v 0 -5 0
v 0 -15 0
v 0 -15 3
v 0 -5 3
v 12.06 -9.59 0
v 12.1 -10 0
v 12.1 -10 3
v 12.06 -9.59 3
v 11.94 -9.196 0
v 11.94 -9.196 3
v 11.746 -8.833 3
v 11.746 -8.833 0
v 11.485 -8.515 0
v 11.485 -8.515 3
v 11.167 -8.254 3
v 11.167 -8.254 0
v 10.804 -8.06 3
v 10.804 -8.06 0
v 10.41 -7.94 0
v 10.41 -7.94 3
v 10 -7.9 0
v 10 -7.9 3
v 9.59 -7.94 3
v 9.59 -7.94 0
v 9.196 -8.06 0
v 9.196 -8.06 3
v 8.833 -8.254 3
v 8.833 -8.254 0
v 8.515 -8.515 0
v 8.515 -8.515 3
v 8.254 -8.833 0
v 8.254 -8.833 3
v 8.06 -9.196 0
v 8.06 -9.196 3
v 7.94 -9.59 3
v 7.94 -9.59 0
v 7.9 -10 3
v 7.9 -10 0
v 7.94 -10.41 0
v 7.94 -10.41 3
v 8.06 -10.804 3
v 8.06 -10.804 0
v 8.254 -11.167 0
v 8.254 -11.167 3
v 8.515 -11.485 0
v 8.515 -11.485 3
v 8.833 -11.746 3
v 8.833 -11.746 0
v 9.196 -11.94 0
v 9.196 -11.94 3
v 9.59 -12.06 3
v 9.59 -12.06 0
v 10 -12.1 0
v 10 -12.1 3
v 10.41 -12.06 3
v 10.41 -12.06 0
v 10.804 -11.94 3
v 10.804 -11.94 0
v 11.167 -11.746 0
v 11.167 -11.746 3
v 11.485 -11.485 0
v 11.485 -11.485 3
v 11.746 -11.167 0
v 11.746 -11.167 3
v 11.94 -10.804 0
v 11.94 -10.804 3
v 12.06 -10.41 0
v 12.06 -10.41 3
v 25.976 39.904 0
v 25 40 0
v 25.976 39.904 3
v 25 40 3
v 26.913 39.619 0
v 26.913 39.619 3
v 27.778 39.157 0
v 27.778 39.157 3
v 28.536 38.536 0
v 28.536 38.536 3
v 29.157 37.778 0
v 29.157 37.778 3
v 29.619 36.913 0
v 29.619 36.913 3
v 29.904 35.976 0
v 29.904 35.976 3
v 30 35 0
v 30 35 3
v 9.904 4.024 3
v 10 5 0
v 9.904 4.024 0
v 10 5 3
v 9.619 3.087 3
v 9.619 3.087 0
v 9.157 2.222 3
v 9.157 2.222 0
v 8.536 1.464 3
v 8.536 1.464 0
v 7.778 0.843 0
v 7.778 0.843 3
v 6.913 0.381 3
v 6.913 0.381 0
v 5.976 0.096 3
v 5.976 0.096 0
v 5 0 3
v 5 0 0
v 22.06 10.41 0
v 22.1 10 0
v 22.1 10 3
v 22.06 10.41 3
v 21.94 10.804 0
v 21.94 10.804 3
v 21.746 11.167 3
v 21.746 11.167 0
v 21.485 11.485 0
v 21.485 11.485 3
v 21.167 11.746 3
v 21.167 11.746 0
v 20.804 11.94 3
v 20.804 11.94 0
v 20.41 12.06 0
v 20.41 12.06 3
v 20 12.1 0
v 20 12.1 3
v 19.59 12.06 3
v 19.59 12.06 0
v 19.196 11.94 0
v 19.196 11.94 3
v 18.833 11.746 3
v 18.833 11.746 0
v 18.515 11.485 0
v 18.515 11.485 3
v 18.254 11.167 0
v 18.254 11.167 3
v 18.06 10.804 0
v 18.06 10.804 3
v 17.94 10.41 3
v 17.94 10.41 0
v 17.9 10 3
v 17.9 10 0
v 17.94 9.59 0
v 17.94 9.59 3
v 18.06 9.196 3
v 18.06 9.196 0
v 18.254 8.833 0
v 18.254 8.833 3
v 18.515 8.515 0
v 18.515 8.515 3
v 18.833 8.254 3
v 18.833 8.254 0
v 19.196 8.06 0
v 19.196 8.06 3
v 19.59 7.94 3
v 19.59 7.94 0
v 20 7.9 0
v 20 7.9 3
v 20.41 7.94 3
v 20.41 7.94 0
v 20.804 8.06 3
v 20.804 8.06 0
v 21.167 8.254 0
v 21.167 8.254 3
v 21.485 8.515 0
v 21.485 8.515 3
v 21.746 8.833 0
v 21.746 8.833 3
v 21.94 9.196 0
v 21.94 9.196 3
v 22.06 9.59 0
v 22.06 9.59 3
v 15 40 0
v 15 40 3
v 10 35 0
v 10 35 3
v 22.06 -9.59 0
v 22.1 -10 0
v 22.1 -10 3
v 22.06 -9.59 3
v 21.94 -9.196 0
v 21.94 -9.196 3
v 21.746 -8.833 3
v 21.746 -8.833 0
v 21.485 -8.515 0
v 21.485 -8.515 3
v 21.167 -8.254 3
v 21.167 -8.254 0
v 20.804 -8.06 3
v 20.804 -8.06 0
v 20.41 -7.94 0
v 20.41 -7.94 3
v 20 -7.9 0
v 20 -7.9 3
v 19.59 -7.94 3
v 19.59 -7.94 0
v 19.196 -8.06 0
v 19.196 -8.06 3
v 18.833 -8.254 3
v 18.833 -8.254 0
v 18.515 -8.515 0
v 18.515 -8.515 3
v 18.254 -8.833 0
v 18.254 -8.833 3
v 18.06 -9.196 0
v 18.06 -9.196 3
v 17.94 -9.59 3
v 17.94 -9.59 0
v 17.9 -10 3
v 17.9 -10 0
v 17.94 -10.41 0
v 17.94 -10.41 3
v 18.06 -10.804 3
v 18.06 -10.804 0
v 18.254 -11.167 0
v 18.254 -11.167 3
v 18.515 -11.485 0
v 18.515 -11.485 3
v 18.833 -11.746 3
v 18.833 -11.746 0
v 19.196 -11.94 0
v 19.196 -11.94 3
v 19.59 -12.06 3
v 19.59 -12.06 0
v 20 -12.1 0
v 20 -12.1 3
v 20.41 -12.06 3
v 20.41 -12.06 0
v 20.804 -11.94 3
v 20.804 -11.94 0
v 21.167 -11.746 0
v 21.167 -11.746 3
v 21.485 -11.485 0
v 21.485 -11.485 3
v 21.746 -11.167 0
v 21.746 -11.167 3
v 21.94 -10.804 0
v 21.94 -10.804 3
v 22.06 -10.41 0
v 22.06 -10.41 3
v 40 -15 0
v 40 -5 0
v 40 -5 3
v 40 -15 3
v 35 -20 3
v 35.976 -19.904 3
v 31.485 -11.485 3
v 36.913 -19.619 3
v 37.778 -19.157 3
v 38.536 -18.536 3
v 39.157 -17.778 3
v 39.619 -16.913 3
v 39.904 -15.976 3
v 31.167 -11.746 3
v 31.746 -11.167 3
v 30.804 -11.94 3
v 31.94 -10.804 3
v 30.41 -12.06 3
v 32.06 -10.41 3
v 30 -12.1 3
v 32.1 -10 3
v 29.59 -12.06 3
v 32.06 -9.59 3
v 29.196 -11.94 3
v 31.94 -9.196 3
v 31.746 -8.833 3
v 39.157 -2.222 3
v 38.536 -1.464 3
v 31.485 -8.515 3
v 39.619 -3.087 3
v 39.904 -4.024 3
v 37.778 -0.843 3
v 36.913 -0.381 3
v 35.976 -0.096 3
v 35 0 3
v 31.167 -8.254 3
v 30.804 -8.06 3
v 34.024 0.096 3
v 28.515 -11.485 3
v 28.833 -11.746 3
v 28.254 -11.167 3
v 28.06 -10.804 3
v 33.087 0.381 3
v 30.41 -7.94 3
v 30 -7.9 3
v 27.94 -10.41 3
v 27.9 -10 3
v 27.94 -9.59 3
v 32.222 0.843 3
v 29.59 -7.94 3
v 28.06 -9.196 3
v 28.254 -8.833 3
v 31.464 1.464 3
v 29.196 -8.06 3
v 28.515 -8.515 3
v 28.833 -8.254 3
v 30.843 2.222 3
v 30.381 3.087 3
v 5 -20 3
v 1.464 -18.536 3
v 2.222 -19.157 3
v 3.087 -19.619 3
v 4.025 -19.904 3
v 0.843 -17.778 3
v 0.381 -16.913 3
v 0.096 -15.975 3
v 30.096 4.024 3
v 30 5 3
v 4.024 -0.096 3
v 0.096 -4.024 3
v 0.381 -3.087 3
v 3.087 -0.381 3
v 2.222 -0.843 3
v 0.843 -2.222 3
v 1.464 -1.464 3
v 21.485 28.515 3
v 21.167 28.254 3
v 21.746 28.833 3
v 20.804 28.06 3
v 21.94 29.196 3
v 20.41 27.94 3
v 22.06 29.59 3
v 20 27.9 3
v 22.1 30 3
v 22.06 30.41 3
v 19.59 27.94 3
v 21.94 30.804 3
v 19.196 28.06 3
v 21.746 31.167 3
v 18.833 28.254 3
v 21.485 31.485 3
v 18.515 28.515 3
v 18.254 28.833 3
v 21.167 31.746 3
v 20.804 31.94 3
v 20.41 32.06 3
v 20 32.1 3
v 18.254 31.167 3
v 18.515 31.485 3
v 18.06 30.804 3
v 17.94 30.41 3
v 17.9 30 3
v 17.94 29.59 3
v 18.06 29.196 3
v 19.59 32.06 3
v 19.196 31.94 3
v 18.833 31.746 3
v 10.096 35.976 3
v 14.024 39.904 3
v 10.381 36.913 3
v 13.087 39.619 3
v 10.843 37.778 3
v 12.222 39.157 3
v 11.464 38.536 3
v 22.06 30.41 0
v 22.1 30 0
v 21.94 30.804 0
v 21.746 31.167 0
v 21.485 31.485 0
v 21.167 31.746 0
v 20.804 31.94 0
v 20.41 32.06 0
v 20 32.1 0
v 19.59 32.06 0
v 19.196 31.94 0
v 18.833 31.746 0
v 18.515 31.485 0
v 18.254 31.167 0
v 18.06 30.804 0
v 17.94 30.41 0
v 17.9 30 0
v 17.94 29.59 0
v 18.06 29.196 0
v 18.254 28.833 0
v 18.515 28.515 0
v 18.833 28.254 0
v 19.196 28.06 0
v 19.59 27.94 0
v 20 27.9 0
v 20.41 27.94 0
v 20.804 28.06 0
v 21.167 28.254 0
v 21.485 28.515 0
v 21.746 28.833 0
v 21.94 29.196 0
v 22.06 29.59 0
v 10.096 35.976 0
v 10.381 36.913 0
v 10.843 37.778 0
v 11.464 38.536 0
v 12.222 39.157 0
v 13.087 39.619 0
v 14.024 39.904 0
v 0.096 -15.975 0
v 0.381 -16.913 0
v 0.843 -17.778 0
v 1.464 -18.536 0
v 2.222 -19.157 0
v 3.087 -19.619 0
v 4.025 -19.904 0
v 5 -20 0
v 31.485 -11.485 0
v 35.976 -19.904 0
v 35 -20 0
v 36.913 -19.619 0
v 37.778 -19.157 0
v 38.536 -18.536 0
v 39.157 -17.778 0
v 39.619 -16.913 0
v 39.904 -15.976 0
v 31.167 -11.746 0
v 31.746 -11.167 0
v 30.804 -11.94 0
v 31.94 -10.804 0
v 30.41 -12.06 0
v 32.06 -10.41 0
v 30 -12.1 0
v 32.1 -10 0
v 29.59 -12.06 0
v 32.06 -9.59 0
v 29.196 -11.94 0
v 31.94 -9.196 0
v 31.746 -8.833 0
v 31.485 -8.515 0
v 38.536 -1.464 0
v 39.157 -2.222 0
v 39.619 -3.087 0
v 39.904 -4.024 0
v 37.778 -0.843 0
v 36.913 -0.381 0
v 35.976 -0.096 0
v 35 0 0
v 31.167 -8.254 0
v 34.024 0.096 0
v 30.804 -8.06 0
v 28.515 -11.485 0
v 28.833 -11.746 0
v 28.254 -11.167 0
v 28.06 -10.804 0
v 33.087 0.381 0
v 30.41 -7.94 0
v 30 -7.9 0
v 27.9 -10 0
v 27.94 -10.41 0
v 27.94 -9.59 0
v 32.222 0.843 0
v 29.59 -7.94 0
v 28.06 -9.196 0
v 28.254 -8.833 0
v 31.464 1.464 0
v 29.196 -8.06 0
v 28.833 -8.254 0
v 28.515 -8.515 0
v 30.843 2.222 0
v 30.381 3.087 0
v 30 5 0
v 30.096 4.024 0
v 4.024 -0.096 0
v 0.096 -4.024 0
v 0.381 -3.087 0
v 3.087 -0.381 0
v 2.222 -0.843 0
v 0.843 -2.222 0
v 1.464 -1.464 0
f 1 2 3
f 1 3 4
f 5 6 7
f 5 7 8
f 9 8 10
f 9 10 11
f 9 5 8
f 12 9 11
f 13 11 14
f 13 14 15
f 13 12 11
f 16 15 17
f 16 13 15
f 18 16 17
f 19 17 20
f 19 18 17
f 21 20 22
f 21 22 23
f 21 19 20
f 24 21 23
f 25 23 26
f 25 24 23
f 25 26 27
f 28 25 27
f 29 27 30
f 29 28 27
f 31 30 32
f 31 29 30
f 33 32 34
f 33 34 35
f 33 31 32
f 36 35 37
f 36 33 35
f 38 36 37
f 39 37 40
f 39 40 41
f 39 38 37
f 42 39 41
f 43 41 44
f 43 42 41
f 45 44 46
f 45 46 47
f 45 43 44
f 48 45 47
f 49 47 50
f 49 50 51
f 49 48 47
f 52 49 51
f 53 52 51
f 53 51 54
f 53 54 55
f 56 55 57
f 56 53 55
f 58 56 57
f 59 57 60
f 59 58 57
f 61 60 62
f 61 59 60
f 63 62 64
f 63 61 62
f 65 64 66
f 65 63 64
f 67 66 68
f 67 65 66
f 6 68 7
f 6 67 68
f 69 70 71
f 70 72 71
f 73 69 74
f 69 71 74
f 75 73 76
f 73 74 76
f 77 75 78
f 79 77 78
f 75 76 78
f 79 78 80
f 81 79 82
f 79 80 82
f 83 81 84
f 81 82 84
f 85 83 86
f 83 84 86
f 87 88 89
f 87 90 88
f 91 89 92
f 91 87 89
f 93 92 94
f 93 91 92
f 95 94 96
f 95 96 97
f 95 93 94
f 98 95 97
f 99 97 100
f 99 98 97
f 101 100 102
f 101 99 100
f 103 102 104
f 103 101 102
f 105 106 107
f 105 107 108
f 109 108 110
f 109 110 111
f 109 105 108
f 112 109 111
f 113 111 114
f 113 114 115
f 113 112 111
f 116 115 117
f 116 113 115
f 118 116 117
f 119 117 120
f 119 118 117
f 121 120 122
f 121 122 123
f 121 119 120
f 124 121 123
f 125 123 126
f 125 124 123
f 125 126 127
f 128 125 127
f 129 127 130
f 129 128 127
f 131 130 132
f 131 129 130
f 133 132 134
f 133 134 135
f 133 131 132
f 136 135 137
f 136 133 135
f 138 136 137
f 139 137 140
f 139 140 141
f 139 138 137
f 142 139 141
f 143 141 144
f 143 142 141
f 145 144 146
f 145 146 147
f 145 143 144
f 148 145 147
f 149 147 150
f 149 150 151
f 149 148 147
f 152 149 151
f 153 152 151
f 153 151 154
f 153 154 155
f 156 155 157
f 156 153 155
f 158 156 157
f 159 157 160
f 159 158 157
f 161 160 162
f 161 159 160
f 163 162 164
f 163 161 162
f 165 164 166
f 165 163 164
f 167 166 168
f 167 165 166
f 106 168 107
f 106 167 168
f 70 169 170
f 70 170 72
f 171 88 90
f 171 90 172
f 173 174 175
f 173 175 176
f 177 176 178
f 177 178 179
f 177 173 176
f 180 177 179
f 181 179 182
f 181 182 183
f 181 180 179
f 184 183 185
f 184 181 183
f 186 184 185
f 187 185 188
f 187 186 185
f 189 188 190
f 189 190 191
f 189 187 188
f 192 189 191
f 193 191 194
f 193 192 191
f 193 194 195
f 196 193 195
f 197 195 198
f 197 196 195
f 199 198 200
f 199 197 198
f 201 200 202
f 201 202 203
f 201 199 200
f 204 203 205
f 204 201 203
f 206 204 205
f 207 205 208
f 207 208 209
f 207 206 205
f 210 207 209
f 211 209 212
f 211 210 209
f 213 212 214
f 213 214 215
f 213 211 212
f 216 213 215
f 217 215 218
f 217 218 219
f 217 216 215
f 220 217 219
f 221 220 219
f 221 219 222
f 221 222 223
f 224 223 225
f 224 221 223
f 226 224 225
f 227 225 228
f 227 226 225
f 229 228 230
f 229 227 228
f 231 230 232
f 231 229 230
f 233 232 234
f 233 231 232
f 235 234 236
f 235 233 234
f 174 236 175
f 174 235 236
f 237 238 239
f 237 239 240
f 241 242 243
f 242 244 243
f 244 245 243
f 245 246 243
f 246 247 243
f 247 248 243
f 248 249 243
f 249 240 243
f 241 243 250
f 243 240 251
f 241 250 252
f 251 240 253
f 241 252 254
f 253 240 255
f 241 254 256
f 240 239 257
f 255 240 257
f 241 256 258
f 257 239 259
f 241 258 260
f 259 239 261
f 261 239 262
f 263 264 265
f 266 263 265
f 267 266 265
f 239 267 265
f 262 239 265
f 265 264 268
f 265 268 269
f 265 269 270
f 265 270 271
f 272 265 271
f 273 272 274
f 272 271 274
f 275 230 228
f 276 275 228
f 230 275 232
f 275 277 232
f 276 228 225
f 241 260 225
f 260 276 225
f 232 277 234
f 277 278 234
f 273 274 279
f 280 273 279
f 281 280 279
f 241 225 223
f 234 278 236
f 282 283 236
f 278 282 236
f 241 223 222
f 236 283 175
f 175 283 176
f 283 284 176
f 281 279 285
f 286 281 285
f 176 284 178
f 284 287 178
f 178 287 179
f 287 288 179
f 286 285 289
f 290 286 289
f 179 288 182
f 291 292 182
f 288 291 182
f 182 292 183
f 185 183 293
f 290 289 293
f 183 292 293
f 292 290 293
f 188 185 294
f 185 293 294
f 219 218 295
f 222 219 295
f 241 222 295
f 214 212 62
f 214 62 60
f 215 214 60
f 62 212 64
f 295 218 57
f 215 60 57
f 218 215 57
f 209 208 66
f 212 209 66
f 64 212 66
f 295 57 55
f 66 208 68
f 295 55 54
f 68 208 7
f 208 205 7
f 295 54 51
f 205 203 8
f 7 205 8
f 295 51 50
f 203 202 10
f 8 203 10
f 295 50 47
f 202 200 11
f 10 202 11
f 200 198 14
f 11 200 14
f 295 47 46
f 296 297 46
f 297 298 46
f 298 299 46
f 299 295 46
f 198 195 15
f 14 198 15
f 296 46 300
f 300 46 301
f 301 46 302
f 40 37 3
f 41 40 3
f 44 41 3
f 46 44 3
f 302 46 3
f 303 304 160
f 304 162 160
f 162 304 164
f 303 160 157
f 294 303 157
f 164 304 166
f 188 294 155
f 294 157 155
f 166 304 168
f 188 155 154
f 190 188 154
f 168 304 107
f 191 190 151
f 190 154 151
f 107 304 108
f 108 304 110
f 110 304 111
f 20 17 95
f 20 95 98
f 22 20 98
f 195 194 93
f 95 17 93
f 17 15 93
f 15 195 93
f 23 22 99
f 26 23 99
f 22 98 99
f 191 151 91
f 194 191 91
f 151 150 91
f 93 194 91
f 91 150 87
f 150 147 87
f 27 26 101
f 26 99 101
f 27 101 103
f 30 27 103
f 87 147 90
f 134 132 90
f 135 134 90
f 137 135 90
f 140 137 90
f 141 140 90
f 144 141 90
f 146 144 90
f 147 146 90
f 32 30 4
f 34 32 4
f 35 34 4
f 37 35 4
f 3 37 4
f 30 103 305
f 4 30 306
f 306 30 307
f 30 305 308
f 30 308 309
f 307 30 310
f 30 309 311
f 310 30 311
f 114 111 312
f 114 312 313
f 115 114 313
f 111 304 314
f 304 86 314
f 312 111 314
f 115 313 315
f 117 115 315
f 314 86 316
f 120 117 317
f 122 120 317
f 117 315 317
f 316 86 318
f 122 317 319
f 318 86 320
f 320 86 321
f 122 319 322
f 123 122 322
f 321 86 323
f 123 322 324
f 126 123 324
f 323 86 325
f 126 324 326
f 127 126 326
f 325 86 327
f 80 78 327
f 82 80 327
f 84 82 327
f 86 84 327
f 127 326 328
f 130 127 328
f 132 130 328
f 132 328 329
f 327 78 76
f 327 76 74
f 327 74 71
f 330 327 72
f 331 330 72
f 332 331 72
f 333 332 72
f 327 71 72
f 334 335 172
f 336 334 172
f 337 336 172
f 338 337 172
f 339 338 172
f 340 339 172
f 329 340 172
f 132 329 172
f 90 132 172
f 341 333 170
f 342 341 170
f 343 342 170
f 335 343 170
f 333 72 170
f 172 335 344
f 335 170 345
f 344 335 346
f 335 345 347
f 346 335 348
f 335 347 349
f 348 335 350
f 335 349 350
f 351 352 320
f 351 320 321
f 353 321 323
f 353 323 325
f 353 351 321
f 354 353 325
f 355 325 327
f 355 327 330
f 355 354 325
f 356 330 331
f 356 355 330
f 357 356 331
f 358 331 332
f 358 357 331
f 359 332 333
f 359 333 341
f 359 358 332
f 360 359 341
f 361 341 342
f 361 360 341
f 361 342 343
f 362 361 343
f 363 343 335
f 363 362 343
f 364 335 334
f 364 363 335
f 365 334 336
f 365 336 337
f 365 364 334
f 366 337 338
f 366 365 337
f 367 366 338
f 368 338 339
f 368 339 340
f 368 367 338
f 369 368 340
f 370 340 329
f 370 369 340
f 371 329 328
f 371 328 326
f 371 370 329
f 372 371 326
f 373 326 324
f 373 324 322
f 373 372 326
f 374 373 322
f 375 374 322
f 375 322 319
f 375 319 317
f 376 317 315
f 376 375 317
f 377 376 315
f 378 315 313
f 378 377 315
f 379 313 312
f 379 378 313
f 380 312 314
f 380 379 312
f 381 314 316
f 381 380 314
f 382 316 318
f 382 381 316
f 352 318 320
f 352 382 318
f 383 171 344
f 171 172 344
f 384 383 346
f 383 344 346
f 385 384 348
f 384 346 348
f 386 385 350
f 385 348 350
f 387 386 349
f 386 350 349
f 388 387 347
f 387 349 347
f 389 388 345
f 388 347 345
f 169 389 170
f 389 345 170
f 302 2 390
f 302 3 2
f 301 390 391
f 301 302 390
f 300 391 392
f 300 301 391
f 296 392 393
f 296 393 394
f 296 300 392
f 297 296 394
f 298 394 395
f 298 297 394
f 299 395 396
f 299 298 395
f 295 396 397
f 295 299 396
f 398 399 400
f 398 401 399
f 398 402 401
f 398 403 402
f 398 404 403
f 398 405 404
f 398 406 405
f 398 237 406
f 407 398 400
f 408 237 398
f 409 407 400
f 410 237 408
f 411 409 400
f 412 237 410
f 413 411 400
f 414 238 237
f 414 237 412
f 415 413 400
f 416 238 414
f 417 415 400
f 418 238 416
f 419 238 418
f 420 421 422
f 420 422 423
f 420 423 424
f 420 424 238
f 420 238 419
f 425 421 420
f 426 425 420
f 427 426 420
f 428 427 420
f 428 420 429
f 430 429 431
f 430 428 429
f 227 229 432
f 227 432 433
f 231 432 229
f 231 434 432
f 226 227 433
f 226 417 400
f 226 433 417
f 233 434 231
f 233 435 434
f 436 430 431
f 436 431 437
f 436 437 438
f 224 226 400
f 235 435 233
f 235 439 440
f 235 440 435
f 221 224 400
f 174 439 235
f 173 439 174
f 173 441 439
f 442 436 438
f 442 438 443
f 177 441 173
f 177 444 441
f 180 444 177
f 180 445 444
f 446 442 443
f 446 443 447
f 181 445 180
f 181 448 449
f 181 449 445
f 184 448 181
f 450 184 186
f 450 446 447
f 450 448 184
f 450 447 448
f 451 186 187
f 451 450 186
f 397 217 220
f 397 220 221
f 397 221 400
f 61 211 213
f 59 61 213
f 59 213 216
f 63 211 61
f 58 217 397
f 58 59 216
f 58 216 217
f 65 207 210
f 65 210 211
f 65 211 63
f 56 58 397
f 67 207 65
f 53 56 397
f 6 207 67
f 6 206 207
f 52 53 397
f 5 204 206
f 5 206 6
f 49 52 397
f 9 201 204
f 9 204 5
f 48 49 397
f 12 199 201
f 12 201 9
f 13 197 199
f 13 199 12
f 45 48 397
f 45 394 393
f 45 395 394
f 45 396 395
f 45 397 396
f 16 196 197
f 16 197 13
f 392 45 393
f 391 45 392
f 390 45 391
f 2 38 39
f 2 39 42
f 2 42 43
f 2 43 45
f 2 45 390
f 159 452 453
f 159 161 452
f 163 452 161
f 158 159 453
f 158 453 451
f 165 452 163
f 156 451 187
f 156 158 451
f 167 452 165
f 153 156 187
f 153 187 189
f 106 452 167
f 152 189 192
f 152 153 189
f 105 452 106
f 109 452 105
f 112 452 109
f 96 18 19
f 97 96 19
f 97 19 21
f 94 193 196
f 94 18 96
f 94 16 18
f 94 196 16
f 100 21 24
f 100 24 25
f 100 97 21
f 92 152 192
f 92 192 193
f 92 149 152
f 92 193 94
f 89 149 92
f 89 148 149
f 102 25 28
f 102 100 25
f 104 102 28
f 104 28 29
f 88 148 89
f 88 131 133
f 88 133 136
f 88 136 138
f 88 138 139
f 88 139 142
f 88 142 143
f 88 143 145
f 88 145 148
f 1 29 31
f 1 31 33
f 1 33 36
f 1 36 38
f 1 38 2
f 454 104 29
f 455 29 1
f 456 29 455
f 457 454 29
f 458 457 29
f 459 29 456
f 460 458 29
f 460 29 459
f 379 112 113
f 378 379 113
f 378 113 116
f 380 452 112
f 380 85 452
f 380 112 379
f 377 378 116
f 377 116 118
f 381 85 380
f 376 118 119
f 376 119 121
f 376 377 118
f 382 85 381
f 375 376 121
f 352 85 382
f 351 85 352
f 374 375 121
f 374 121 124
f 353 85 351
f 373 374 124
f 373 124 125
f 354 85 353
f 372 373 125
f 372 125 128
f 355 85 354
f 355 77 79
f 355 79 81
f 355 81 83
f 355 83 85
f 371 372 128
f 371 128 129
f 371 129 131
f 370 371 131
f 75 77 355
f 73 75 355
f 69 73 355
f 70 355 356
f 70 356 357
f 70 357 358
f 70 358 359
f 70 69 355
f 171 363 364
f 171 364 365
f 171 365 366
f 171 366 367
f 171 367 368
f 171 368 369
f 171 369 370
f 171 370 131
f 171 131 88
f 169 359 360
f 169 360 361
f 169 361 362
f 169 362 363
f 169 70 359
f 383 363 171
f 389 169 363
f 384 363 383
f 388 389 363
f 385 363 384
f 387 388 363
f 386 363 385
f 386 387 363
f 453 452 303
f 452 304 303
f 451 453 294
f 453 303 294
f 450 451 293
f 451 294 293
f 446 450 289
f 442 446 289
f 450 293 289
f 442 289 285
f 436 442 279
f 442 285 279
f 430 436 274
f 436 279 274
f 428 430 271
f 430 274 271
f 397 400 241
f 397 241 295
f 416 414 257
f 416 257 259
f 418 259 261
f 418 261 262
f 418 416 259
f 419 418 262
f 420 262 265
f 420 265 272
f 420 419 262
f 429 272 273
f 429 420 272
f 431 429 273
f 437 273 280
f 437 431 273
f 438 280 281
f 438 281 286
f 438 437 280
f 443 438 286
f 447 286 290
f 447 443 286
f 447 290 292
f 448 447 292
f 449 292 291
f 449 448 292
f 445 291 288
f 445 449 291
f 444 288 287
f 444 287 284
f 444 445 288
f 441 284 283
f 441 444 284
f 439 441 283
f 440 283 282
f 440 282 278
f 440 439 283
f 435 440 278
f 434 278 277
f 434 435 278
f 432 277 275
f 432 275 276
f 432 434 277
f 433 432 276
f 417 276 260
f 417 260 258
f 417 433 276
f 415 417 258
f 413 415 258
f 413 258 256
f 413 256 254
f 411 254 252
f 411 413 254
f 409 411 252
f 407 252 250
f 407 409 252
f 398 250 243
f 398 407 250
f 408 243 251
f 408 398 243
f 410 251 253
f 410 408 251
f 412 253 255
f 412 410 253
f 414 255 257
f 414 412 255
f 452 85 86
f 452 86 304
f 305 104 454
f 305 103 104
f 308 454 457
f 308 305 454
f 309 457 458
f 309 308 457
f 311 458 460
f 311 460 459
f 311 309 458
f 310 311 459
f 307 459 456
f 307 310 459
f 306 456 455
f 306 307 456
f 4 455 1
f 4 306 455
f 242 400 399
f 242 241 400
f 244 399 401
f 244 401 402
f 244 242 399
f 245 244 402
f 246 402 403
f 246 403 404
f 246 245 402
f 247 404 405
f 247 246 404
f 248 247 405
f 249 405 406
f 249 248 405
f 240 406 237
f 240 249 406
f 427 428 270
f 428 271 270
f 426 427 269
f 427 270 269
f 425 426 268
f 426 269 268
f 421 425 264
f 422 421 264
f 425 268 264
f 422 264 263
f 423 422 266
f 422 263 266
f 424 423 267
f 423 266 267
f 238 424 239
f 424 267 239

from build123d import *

# Parameters (mm, degrees)
SKETCH_1_R      = 2.1
EXTRUDE_1_DEPTH = 3
FILLET_1_R      = 5
FILLET_2_R      = 5


with BuildPart() as part:
    # 草图1 → 凸台-拉伸1 (new body)
    with BuildSketch(Plane.XY):
        Polygon((10, 0), (10, 40), (30, 40), (30, 0), (40, 0), (40, -20), (0, -20), (0, 0), align=None)
        with Locations((20, -10)):
            Circle(SKETCH_1_R, mode=Mode.SUBTRACT)
        with Locations((10, -10)):
            Circle(SKETCH_1_R, mode=Mode.SUBTRACT)
        with Locations((30, -10)):
            Circle(SKETCH_1_R, mode=Mode.SUBTRACT)
        with Locations((20, 10)):
            Circle(SKETCH_1_R, mode=Mode.SUBTRACT)
        with Locations((20, 30)):
            Circle(SKETCH_1_R, mode=Mode.SUBTRACT)
    extrude(amount=EXTRUDE_1_DEPTH)

    # 圆角1
    fillet_1_edges = [part.edges().sort_by_distance(p)[0] for p in [
        (10, 40, 1.5),
        (30, 40, 1.5),
        (40, -20, 1.5),
        (40, 0, 1.5),
        (30, 0, 1.5),
        (10, 0, 1.5),
        (0, 0, 1.5),
    ]]
    fillet(fillet_1_edges, radius=FILLET_1_R - 0.0001)  # a hair under: the kernel refuses the full size

    # 圆角2
    fillet_2_edges = [part.edges().sort_by_distance(p)[0] for p in [
        (0, -20, 1.5),
    ]]
    fillet(fillet_2_edges, radius=FILLET_2_R)


solid = part.part
